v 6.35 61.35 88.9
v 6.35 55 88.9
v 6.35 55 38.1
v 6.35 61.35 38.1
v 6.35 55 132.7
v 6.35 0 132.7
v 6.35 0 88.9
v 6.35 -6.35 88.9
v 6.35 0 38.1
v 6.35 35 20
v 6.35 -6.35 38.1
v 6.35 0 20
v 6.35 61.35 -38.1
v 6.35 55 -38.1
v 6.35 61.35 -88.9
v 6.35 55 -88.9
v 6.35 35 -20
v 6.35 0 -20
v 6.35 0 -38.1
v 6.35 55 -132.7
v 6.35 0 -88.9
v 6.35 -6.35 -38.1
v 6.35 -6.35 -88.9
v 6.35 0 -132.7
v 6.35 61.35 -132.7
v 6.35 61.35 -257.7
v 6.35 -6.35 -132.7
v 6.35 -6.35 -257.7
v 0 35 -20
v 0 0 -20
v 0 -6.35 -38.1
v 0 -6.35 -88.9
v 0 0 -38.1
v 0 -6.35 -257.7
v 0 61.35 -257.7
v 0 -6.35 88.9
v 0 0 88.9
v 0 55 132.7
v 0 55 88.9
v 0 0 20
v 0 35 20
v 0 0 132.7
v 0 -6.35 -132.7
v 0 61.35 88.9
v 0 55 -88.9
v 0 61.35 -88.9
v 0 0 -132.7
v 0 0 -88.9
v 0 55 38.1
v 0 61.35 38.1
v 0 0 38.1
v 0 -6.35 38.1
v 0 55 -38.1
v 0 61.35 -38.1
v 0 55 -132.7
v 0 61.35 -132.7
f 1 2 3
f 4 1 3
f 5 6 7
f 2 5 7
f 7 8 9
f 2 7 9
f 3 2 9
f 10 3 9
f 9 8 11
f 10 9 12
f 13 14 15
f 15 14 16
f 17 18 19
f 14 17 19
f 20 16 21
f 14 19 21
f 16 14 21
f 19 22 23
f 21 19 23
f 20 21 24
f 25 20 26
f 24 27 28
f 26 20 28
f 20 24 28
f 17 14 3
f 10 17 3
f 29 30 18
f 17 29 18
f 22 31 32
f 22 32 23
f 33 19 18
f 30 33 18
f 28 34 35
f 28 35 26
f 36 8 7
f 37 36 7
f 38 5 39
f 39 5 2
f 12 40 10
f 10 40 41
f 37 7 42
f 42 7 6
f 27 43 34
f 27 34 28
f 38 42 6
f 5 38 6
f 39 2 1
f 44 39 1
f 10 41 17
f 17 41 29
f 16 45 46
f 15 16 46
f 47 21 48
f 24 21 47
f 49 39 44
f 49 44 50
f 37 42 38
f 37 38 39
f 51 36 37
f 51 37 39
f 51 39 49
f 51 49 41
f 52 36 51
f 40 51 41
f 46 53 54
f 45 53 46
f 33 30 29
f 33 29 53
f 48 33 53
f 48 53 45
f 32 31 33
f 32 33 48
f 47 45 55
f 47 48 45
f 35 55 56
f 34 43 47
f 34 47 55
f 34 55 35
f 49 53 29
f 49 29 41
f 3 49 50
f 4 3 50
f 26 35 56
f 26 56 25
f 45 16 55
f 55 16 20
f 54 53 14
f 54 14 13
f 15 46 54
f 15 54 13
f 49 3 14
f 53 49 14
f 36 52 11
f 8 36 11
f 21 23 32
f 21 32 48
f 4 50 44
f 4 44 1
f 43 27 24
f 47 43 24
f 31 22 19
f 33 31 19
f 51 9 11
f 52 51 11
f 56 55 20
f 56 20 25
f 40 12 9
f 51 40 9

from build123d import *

# Parameters (mm, degrees)
BOSS_EXTRUDE1_DEPTH = 6.35
SKETCH4_W           = 6.35
SKETCH4_H           = 237.700000096
SKETCH4_H_2         = 112.7
BOSS_EXTRUDE2_DEPTH = 6.35
SKETCH5_W           = 6.35
SKETCH5_H           = 390.400000096
BOSS_EXTRUDE3_DEPTH = 6.35
SKETCH6_W           = 76.2
SKETCH6_H           = 6.35
SKETCH6_W_2         = 43.8
CUT_EXTRUDE1_DEPTH  = 265.978178443


with BuildPart() as part:
    # Sketch3 → Boss-Extrude1 (new body)
    with BuildSketch(Plane(origin=(0, 0, 0), x_dir=(0, 0, -1), z_dir=(1, 0, 0))):
        Polygon((-132.7, 55.000000012), (-132.7, 0), (-20, 0), (-20, 35), (20, 35), (20, 0), (257.700000096, 0), (257.700000096, 55.000000012), align=None)
    extrude(amount=BOSS_EXTRUDE1_DEPTH)

    # Sketch4 → Boss-Extrude2 (add)
    with BuildSketch(Plane.XZ):
        with Locations((3.175, -138.850000048)):
            Rectangle(SKETCH4_W, SKETCH4_H)
        with Locations((3.175, 76.35)):
            Rectangle(SKETCH4_W, SKETCH4_H_2)
    extrude(amount=BOSS_EXTRUDE2_DEPTH)

    # Sketch5 → Boss-Extrude3 (add)
    with BuildSketch(Plane(origin=(0, 55.000000012, 0), x_dir=(1, 0, 0), z_dir=(0, 1, 0))):
        with Locations((3.175, 62.500000048)):
            Rectangle(SKETCH5_W, SKETCH5_H)
    extrude(amount=BOSS_EXTRUDE3_DEPTH)

    # Sketch6 → Cut-Extrude1 (cut, through all)
    with BuildSketch(Plane(origin=(6.35, 0, 0), x_dir=(0, 0, -1), z_dir=(1, 0, 0))):
        Polygon((-132.7, 55.000000012), (-126.35, 55.000000012), (-88.9, 55.000000012), (-88.9, 61.350000012), (-132.7, 61.350000012), align=None)
        Polygon((-88.9, 0), (-126.35, 0), (-132.7, 0), (-132.7, -6.35), (-88.9, -6.35), align=None)
        with Locations((0, 58.175000012)):
            Rectangle(SKETCH6_W, SKETCH6_H)
        Polygon((26.35, 0), (20, 0), (20, -6.35), (38.1, -6.35), (38.1, 0), align=None)
        Polygon((-26.35, 0), (-38.1, 0), (-38.1, -6.35), (-20, -6.35), (-20, 0), align=None)
        with Locations((110.8, 58.175000012)):
            Rectangle(SKETCH6_W_2, SKETCH6_H)
        with Locations((110.8, -3.175)):
            Rectangle(SKETCH6_W_2, SKETCH6_H)
    extrude(amount=-CUT_EXTRUDE1_DEPTH, mode=Mode.SUBTRACT)


solid = part.part
